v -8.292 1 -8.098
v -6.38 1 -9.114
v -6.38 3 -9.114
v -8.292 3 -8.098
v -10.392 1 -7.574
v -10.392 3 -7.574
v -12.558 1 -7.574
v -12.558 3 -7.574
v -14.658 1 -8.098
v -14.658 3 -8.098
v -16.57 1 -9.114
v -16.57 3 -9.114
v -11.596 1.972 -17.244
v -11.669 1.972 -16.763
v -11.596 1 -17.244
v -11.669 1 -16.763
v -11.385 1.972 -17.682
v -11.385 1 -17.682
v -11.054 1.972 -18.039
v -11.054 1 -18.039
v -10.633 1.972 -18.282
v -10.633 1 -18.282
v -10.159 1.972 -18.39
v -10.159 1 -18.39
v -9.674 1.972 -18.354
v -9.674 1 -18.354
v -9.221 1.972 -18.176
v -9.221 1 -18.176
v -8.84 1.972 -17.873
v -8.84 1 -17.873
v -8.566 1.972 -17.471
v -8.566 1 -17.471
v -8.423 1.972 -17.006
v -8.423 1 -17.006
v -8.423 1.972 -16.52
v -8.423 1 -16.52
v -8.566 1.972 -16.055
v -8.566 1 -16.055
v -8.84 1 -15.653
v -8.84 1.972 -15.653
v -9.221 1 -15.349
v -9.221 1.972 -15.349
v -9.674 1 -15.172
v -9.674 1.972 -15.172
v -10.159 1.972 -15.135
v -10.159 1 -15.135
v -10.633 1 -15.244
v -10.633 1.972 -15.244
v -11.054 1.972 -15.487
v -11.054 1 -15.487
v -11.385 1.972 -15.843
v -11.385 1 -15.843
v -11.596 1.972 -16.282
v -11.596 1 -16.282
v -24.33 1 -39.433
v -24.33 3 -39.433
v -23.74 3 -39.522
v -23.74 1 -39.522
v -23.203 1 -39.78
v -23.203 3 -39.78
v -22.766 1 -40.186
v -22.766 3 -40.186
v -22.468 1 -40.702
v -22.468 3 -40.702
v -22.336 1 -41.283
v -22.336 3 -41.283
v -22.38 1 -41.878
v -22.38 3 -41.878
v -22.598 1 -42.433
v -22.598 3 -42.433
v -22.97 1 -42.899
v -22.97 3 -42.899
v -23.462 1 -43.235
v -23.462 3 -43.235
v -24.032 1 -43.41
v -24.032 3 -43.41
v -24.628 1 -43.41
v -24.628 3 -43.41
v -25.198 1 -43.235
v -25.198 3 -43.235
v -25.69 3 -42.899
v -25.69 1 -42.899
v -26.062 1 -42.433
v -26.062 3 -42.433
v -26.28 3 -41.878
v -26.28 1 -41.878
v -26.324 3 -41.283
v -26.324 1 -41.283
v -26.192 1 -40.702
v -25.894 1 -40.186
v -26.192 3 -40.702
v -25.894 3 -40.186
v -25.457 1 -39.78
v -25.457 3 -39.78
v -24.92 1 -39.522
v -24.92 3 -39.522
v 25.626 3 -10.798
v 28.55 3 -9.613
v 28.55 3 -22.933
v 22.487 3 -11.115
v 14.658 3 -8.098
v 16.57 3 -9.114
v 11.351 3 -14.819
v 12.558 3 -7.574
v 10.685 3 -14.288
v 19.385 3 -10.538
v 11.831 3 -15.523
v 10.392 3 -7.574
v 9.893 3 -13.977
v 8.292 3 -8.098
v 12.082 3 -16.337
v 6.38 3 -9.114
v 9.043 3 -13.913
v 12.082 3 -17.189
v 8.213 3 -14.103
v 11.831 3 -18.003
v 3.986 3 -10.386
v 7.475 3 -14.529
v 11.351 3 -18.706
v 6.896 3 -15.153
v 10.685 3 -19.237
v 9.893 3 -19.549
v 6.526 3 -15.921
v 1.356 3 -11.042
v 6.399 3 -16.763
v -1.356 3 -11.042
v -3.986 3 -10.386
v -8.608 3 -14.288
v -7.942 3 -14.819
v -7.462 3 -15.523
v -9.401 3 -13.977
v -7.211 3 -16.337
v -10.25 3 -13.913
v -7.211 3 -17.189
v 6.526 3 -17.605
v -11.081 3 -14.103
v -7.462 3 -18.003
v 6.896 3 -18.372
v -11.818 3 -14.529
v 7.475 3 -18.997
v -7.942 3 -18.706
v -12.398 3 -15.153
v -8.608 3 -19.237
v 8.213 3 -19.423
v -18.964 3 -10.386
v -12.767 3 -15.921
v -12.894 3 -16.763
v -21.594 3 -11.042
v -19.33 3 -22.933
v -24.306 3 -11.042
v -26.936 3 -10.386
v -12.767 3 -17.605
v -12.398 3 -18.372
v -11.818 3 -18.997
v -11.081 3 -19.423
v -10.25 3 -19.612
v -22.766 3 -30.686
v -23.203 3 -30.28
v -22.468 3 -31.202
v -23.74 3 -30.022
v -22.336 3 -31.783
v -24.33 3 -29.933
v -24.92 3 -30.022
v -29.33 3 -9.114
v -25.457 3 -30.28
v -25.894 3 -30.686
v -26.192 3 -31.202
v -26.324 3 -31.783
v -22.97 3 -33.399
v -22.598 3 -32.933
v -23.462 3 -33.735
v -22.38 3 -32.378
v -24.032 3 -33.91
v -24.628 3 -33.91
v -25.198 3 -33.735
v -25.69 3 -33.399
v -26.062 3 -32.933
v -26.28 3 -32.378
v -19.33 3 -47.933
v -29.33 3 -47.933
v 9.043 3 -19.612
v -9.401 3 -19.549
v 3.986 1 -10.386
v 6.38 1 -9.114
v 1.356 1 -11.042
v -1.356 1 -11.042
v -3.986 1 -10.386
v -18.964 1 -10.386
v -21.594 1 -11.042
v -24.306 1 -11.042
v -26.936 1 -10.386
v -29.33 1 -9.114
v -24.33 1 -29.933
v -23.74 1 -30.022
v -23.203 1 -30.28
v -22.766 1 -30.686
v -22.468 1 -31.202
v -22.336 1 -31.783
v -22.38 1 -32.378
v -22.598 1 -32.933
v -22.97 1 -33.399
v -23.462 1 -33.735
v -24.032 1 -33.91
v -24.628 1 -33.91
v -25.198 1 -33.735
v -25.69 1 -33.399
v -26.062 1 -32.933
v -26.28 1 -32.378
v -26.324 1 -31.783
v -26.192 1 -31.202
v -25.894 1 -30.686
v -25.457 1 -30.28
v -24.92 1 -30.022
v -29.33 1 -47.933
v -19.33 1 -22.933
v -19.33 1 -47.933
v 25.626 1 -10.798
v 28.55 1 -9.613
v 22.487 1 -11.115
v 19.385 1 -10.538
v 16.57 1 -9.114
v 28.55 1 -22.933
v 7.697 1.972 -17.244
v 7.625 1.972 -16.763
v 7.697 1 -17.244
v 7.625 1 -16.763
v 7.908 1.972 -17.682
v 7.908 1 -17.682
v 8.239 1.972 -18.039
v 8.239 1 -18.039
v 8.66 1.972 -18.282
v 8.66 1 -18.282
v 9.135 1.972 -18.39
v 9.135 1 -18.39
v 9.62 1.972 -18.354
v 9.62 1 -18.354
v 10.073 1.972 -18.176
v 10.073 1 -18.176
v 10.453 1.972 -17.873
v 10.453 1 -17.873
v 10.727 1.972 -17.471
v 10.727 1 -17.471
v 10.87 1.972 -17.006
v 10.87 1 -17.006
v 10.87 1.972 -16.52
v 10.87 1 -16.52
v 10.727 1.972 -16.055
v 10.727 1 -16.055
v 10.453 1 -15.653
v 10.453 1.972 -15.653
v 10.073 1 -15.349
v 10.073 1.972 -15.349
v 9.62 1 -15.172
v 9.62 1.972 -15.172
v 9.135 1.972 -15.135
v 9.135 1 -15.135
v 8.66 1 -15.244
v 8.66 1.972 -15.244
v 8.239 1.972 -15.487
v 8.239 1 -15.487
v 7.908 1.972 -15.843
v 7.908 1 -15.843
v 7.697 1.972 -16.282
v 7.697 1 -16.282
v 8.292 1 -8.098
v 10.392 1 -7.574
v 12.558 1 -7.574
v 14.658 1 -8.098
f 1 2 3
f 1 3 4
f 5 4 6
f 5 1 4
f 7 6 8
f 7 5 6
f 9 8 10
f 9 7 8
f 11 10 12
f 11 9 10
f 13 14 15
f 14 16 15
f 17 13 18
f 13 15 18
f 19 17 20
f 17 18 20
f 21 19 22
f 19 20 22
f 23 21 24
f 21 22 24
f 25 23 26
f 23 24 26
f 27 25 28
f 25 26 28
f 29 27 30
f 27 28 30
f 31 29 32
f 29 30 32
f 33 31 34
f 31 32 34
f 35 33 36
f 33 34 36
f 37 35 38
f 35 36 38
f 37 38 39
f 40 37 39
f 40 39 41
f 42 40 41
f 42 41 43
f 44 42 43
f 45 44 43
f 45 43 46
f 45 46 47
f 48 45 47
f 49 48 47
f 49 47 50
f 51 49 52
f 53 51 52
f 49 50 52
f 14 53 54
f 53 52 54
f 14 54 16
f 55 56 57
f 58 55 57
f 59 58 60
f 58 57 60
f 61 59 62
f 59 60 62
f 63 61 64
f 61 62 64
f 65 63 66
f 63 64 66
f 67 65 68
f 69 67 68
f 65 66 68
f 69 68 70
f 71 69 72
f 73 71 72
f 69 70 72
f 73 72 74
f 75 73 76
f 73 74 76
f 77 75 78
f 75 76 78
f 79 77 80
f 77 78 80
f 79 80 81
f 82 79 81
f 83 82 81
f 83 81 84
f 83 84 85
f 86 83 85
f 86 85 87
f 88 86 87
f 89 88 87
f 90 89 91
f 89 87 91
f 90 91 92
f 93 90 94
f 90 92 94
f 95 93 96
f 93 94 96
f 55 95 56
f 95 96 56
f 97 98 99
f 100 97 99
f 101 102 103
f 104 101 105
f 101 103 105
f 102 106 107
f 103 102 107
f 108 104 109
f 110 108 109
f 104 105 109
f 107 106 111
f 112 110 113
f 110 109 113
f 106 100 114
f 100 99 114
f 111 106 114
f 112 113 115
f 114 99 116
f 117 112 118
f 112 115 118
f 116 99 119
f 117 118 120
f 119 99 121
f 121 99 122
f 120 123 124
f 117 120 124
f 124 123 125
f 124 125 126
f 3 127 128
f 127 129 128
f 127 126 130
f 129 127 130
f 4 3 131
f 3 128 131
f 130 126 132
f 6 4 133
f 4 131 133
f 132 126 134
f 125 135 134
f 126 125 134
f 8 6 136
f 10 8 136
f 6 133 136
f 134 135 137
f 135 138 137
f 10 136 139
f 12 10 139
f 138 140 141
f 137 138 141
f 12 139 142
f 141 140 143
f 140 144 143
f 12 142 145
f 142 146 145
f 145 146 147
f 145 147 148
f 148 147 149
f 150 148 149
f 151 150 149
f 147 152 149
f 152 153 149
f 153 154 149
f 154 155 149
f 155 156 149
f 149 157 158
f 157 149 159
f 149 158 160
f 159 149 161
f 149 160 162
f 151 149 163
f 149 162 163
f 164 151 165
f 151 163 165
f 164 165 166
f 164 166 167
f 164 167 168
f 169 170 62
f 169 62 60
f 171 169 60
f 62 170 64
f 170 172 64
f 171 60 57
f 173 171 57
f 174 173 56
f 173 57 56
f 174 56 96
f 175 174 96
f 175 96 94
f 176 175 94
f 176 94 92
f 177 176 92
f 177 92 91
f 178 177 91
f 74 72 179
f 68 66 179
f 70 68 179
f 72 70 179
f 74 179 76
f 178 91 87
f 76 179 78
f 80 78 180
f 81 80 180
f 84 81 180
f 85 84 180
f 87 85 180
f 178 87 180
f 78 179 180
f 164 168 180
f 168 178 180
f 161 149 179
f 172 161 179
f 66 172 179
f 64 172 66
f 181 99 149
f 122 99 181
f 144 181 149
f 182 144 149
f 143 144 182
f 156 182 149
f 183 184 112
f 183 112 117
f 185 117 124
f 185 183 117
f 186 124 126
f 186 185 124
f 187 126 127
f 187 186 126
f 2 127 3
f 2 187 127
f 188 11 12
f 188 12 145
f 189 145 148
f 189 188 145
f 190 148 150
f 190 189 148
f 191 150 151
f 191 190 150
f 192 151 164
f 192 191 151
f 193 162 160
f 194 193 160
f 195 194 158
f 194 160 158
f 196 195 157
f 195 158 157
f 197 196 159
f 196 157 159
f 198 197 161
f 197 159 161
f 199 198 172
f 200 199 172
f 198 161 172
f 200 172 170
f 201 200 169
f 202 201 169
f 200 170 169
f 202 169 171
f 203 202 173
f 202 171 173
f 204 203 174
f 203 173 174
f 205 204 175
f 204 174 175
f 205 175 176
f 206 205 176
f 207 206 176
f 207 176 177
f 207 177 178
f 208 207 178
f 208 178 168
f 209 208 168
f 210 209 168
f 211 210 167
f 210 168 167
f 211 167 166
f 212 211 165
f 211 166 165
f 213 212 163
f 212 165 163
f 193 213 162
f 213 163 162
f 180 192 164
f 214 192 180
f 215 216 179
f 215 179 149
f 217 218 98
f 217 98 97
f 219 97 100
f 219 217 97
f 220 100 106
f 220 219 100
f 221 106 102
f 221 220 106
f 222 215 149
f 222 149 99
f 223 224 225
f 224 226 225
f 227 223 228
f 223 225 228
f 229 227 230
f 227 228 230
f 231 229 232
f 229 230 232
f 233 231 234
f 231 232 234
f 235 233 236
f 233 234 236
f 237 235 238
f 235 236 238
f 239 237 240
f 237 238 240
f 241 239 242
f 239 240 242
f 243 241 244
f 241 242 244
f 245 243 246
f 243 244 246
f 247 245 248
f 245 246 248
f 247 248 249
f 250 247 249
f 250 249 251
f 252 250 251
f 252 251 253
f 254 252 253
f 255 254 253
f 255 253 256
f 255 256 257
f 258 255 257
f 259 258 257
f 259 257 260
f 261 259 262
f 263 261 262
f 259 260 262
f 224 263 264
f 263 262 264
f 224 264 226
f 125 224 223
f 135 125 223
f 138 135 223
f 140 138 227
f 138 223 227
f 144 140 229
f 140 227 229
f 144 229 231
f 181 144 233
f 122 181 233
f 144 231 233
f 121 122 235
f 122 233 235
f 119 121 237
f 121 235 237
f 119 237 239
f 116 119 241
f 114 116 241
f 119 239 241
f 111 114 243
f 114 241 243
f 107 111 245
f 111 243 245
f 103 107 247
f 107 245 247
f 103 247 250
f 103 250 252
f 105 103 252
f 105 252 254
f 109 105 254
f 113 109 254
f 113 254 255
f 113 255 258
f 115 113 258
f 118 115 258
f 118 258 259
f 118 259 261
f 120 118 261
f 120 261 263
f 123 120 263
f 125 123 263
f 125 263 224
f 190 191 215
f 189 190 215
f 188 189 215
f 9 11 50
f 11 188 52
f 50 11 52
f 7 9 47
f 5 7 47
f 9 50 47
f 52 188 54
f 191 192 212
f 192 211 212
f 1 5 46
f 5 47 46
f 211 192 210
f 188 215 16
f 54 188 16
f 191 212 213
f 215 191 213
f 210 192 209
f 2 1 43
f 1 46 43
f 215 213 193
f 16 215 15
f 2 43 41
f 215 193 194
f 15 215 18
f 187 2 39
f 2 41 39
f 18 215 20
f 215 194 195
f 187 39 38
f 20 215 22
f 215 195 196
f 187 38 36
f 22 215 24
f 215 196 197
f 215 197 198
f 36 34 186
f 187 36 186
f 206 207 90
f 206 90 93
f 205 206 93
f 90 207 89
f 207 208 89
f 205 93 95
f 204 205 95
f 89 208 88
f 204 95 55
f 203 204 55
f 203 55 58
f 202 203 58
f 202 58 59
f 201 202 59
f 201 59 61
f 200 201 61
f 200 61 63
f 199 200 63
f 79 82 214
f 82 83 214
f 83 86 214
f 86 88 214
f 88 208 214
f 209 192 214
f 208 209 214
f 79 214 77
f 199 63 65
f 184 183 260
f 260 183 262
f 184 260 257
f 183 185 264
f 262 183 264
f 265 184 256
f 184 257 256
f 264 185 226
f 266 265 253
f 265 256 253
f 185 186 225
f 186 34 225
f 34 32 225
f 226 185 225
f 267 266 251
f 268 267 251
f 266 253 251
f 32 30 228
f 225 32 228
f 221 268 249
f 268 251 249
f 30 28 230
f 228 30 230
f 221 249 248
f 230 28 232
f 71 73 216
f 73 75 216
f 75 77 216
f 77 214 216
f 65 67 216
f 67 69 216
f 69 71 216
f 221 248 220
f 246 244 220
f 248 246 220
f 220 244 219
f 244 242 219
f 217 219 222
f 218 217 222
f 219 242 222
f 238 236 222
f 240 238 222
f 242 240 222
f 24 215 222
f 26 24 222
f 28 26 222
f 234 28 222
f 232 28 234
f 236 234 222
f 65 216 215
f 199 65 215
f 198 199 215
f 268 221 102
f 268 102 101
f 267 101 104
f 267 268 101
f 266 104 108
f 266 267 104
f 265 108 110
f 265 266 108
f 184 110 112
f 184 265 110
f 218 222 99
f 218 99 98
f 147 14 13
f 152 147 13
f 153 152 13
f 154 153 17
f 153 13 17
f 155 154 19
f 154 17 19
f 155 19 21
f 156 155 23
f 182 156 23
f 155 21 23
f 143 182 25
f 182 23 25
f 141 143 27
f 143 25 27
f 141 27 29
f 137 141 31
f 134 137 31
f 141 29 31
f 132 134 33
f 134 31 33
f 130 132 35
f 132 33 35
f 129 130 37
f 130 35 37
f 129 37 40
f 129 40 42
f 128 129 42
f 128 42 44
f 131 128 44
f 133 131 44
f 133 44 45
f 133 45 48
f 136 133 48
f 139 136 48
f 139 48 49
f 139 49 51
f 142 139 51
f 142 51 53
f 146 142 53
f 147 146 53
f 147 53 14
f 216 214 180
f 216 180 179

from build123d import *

# Parameters (mm, degrees)
BOSS_EXTRUDE1_DEPTH                               = 3
CONVERT_SOLID1_DEPTH                              = 1
SKETCH8_R                                         = 2
CUT_EXTRUDE1_DEPTH                                = 2
CSK_FOR_4_FLAT_HEAD_MACHINE_SCREW_100_D           = 3.2639
CSK_FOR_4_FLAT_HEAD_MACHINE_SCREW_100_DEPTH       = 2
CSK_FOR_4_FLAT_HEAD_MACHINE_SCREW_100_CSINK_D     = 5.715
CSK_FOR_4_FLAT_HEAD_MACHINE_SCREW_100_CSINK_ANGLE = 100
CSK_FOR_4_FLAT_HEAD_MACHINE_SCREW_100_TIP         = 0.980574487


# Read off the part's stored shape, not the designer's step: Convert-Solid1
with BuildPart() as part:
    # Sketch2 → Boss-Extrude1 (new body)
    with BuildSketch(Plane(origin=(0, 0, 0), x_dir=(1, 0, 0), z_dir=(0, 1, 0))):
        with BuildLine():
            Line((-29.33, 9.113793118), (-29.33, 22.932784456))
            Line((-29.33, 22.932784456), (-29.33, 47.932784456))
            Line((-29.33, 47.932784456), (-19.33, 47.932784456))
            Line((-19.33, 47.932784456), (-19.33, 22.932784456))
            Line((-19.33, 22.932784456), (28.55, 22.932784456))
            Line((28.55, 22.932784456), (28.55, 9.612784456))
            ThreePointArc((28.55, 9.612784456), (22.487022583, 11.115362203), (16.57, 9.113793118))
            ThreePointArc((16.57, 9.113793118), (11.475, 7.507664738), (6.38, 9.113793118))
            ThreePointArc((6.38, 9.113793118), (0, 11.125), (-6.38, 9.113793118))
            ThreePointArc((-6.38, 9.113793118), (-11.475, 7.507664738), (-16.57, 9.113793118))
            ThreePointArc((-16.57, 9.113793118), (-22.95, 11.125), (-29.33, 9.113793118))
        make_face()
    extrude(amount=BOSS_EXTRUDE1_DEPTH)

    # Convert-Solid1 outline → Convert-Solid1 (cut)
    with BuildSketch(Plane(origin=(0, 0, 0), x_dir=(1, 0, 0), z_dir=(0, 1, 0))):
        with BuildLine():
            Line((-29.33, 47.932784456), (-29.33, 9.113793118))
            ThreePointArc((-29.33, 9.113793118), (-22.95, 11.125), (-16.57, 9.113793118))
            ThreePointArc((-16.57, 9.113793118), (-11.475, 7.507664738), (-6.38, 9.113793118))
            ThreePointArc((-6.38, 9.113793118), (0, 11.125), (6.38, 9.113793118))
            ThreePointArc((6.38, 9.113793118), (11.475, 7.507664738), (16.57, 9.113793118))
            ThreePointArc((16.57, 9.113793118), (22.487022583, 11.115362203), (28.55, 9.612784456))
            Line((28.55, 9.612784456), (28.55, 22.932784456))
            Line((28.55, 22.932784456), (-19.33, 22.932784456))
            Line((-19.33, 22.932784456), (-19.33, 47.932784456))
            Line((-19.33, 47.932784456), (-29.33, 47.932784456))
        make_face()
    extrude(amount=CONVERT_SOLID1_DEPTH, mode=Mode.SUBTRACT)

    # Sketch8 → Cut-Extrude1 (cut)
    with BuildSketch(Plane(origin=(0, 3, 0), x_dir=(1, 0, 0), z_dir=(0, 1, 0))):
        with Locations(Location((-24.33, 41.432784456, 0), (0, 0, 270))):
            Circle(SKETCH8_R)
        with Locations(Location((-24.33, 31.932784456, 0), (0, 0, 270))):
            Circle(SKETCH8_R)
    extrude(amount=-CUT_EXTRUDE1_DEPTH, mode=Mode.SUBTRACT)

    # CSK for #4 Flat Head Machine Screw (100)1
    with Locations(Plane(origin=(0, 3, 0), x_dir=(1, 0, 0), z_dir=(0, 1, 0))):
        with Locations((9.256666667, 16.762784456), (-10.036666667, 16.762784456)):
            CounterSinkHole(CSK_FOR_4_FLAT_HEAD_MACHINE_SCREW_100_D / 2, CSK_FOR_4_FLAT_HEAD_MACHINE_SCREW_100_CSINK_D / 2, depth=CSK_FOR_4_FLAT_HEAD_MACHINE_SCREW_100_DEPTH, counter_sink_angle=CSK_FOR_4_FLAT_HEAD_MACHINE_SCREW_100_CSINK_ANGLE)
            with Locations((0, 0, -(CSK_FOR_4_FLAT_HEAD_MACHINE_SCREW_100_DEPTH + CSK_FOR_4_FLAT_HEAD_MACHINE_SCREW_100_TIP / 2))):  # 118° drill point
                Cone(0, CSK_FOR_4_FLAT_HEAD_MACHINE_SCREW_100_D / 2, CSK_FOR_4_FLAT_HEAD_MACHINE_SCREW_100_TIP, mode=Mode.SUBTRACT)


solid = part.part
